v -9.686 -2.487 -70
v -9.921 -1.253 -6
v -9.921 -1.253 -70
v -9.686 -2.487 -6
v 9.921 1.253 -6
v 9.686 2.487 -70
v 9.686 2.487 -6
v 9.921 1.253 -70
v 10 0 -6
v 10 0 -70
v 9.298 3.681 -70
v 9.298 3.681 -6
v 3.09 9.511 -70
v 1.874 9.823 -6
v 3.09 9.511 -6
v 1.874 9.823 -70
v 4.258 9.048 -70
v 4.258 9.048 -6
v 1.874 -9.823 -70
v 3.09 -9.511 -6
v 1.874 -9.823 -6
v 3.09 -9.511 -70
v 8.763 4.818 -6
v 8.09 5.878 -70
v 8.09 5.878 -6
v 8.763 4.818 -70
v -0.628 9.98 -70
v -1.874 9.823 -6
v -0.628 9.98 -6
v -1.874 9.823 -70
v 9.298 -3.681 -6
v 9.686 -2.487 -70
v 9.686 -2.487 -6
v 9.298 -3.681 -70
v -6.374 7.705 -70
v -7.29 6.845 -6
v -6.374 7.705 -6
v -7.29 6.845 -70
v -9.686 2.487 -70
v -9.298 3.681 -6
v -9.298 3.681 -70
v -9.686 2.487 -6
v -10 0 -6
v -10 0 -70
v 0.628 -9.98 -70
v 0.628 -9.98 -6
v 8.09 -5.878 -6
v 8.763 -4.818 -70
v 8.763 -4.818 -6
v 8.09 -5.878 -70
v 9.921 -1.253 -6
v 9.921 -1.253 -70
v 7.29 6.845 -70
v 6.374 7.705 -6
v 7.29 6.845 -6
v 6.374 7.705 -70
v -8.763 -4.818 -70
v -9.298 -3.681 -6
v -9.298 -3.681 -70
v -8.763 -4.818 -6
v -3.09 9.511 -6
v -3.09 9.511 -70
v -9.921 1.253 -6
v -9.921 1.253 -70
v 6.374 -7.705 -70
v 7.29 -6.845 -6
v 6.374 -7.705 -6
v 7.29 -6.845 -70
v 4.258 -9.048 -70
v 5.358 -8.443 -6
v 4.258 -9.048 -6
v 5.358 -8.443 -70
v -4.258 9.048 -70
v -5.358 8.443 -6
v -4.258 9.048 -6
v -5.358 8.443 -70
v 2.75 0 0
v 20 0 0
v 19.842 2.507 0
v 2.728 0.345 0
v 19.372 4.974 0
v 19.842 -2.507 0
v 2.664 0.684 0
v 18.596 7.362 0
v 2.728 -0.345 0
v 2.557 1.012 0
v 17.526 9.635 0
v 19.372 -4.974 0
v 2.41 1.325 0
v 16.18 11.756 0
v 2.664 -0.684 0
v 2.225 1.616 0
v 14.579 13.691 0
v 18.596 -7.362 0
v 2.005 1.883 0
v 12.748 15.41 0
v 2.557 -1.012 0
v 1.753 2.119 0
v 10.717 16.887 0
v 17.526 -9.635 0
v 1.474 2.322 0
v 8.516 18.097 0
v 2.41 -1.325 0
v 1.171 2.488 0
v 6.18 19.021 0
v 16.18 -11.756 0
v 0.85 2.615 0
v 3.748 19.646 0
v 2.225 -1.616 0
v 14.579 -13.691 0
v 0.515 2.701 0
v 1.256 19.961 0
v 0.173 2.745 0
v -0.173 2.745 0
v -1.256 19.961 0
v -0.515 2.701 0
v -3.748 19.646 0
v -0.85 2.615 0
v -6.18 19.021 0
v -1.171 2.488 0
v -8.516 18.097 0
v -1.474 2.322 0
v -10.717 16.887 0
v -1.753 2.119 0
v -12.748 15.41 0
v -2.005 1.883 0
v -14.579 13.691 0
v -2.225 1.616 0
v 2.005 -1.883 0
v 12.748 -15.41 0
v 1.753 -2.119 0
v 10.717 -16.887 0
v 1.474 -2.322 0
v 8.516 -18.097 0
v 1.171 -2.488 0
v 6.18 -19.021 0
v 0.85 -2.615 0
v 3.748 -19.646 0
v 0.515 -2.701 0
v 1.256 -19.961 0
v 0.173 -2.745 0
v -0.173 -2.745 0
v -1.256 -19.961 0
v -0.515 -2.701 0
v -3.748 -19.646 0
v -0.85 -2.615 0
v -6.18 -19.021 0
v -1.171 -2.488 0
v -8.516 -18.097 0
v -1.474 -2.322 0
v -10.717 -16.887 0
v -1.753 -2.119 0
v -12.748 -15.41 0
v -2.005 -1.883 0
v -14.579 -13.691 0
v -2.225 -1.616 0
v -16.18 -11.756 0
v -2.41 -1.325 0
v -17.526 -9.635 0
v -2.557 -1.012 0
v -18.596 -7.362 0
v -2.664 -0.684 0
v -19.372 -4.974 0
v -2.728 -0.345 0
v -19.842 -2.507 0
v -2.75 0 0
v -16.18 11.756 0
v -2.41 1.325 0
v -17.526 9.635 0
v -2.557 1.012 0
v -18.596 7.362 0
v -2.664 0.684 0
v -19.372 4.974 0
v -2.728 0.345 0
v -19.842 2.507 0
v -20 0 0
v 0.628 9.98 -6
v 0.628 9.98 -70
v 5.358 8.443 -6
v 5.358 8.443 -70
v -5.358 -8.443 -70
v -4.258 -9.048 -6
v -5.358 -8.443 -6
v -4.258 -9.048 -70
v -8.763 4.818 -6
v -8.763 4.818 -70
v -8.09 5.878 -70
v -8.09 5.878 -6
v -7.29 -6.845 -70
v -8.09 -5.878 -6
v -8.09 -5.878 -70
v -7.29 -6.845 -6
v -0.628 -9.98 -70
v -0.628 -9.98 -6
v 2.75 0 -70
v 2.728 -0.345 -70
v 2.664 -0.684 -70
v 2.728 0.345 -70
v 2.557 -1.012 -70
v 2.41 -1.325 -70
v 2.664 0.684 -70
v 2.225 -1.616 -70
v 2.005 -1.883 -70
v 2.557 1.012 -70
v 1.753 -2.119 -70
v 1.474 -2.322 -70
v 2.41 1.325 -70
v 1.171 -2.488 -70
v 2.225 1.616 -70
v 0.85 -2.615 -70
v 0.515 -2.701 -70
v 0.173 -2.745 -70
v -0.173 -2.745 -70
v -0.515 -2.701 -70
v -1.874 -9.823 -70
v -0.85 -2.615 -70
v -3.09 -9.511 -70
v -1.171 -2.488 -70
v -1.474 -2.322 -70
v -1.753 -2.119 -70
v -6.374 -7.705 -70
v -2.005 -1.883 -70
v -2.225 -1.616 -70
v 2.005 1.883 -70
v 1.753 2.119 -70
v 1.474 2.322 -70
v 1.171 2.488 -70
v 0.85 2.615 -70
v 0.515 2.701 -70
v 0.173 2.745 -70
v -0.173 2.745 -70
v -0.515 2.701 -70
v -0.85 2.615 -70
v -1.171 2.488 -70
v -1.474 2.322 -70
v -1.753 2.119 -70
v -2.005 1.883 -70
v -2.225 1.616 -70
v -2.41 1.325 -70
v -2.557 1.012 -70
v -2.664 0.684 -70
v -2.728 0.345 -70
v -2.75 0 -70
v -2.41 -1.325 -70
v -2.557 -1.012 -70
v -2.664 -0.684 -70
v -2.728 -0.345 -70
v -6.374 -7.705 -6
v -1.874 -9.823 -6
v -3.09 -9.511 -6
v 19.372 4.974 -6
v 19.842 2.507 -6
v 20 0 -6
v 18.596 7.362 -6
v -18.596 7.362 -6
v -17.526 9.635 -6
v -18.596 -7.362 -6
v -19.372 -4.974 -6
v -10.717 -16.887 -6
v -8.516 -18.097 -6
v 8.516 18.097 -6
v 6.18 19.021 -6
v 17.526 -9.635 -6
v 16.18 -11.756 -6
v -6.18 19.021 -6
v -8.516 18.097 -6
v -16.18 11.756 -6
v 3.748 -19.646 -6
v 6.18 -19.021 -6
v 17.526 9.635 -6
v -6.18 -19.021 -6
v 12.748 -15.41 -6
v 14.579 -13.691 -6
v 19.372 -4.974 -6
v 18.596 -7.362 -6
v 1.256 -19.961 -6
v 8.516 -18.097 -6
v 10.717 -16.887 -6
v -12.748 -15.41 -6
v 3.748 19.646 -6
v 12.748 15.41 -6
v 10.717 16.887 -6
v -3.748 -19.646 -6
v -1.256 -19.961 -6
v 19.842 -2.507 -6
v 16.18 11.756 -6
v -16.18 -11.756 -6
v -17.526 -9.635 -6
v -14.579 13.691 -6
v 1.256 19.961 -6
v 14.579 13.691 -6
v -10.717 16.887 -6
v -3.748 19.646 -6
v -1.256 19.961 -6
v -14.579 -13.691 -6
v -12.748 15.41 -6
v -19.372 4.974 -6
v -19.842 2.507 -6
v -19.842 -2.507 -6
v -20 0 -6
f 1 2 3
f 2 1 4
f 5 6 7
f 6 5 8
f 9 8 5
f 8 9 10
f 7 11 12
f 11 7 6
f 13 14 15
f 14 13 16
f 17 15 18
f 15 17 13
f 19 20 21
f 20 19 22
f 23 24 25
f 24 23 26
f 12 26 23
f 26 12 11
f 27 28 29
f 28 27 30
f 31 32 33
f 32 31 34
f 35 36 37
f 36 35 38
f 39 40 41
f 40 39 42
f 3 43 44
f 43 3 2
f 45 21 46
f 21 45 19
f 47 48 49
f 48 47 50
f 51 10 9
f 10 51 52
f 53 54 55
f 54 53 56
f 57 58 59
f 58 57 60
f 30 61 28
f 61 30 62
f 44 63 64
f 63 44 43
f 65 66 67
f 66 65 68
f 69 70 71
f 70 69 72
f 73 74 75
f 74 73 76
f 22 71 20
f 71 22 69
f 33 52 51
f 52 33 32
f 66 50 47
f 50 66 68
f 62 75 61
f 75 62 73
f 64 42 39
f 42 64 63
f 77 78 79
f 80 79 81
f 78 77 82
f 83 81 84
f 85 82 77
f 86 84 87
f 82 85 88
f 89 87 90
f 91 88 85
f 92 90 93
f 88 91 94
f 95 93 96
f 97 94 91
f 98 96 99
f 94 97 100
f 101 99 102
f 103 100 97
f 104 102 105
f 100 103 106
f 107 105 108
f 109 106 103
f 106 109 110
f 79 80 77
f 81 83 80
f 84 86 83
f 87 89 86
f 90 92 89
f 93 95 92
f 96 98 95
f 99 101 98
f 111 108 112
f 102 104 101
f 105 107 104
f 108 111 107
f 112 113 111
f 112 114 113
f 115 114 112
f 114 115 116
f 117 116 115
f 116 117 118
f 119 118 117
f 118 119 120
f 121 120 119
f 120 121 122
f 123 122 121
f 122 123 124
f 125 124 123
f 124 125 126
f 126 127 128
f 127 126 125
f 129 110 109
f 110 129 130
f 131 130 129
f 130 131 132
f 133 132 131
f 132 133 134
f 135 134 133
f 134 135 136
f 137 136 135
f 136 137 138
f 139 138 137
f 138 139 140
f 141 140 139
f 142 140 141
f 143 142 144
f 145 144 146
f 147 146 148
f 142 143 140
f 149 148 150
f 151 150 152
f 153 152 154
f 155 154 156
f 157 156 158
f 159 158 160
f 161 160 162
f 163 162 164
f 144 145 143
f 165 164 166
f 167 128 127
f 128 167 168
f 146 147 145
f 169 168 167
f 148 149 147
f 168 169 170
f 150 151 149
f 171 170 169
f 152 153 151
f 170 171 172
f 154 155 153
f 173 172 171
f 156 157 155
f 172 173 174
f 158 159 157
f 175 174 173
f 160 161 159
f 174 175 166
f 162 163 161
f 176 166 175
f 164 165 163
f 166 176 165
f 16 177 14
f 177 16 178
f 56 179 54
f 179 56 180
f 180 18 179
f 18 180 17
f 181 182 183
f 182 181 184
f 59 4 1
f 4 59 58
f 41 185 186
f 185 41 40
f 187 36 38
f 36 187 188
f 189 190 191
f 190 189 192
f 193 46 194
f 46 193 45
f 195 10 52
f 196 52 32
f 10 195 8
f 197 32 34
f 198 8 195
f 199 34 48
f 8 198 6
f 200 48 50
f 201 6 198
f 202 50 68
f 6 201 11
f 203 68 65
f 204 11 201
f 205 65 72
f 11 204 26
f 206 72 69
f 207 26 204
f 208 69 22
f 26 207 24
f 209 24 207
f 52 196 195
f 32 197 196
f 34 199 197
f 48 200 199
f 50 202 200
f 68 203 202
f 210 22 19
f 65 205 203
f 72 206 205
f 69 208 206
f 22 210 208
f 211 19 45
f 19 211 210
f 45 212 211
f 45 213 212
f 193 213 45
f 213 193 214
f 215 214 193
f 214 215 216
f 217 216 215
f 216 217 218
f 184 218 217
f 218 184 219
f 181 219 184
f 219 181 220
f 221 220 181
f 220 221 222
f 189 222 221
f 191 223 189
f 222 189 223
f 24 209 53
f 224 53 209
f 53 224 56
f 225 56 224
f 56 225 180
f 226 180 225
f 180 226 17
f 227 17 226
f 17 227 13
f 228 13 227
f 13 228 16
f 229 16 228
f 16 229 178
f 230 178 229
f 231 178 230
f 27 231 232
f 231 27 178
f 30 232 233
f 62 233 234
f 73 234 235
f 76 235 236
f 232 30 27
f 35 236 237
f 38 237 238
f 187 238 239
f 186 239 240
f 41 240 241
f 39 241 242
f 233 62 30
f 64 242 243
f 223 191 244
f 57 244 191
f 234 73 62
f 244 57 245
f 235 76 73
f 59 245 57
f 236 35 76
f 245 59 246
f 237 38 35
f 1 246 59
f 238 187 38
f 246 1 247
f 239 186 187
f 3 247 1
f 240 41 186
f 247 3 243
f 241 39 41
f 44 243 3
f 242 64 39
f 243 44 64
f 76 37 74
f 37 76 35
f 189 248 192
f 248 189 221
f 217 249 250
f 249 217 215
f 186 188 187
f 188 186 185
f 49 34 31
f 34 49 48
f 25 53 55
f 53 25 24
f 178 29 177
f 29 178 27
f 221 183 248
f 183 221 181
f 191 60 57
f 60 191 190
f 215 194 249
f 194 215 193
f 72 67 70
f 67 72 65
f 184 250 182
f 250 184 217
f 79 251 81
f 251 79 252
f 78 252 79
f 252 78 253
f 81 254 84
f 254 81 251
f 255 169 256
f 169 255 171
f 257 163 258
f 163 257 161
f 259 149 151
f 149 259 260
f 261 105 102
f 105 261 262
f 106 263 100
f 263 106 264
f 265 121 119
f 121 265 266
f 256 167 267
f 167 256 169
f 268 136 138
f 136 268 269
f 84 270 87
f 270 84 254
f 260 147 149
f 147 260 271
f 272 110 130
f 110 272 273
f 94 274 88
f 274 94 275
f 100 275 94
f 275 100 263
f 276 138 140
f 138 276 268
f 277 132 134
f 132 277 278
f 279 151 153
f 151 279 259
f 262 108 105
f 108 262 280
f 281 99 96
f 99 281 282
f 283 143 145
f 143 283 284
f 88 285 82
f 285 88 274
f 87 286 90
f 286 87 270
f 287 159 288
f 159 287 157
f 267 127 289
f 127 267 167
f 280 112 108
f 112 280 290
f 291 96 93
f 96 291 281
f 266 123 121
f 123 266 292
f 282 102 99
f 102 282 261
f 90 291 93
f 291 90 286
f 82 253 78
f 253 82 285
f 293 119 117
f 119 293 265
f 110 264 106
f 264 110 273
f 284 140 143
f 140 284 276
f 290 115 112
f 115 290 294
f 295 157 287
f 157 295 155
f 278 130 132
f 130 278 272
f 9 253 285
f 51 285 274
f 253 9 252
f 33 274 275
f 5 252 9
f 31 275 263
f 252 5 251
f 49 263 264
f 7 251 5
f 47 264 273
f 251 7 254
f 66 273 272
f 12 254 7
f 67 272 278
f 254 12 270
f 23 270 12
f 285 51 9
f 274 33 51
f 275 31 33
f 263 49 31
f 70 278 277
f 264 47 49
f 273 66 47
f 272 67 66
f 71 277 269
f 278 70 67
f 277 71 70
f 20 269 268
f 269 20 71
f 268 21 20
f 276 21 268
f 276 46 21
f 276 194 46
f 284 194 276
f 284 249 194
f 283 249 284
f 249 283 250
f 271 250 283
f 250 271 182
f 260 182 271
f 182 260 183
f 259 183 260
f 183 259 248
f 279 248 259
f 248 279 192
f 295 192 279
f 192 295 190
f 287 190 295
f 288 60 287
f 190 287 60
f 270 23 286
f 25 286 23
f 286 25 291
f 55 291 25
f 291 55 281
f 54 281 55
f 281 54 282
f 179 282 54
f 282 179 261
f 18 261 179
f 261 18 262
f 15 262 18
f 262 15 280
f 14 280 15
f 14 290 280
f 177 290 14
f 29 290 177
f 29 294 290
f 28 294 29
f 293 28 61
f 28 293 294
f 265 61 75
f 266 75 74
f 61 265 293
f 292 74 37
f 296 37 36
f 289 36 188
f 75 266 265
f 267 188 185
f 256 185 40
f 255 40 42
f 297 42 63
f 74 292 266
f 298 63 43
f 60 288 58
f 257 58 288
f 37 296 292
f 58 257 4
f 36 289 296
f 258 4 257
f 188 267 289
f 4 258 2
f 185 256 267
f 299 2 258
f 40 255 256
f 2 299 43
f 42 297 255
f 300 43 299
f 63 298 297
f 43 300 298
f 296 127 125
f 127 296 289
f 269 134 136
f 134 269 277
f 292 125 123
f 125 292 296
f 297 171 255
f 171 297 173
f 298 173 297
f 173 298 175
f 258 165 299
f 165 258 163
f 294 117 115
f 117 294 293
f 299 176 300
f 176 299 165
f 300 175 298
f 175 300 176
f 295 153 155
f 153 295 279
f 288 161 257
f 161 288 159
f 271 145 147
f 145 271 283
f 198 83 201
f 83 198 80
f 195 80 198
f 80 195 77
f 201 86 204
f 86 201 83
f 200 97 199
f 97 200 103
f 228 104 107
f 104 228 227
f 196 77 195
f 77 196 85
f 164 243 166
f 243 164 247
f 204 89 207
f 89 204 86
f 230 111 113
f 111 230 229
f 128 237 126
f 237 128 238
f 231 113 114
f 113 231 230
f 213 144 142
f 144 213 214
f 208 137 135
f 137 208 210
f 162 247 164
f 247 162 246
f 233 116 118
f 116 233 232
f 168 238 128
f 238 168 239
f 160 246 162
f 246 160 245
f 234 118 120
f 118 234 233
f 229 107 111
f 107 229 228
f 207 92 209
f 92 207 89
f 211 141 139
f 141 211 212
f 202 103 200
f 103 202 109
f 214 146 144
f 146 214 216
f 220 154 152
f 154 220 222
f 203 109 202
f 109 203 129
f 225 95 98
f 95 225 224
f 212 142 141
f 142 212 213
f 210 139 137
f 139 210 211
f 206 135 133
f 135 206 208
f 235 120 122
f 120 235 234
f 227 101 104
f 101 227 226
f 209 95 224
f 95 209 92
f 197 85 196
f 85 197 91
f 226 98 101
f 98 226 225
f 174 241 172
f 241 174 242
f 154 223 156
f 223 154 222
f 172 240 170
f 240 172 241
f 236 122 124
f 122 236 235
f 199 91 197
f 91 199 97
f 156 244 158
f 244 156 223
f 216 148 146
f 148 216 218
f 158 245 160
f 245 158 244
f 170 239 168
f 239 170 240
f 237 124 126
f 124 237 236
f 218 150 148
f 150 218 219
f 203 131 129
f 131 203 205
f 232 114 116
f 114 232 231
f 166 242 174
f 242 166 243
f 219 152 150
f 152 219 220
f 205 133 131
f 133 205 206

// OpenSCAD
$fn = 50;


difference() {
	union() {
		translate(v = [0, 0, -70.0000000000]) {
			cylinder(h = 70, r = 10.0000000000);
		}
		translate(v = [0, 0, -6.0000000000]) {
			cylinder(h = 6, r = 20.0000000000);
		}
	}
	union() {
		#translate(v = [0, 0, -70]) {
			cylinder(h = 70, r = 2.7500000000);
		}
	}
}
